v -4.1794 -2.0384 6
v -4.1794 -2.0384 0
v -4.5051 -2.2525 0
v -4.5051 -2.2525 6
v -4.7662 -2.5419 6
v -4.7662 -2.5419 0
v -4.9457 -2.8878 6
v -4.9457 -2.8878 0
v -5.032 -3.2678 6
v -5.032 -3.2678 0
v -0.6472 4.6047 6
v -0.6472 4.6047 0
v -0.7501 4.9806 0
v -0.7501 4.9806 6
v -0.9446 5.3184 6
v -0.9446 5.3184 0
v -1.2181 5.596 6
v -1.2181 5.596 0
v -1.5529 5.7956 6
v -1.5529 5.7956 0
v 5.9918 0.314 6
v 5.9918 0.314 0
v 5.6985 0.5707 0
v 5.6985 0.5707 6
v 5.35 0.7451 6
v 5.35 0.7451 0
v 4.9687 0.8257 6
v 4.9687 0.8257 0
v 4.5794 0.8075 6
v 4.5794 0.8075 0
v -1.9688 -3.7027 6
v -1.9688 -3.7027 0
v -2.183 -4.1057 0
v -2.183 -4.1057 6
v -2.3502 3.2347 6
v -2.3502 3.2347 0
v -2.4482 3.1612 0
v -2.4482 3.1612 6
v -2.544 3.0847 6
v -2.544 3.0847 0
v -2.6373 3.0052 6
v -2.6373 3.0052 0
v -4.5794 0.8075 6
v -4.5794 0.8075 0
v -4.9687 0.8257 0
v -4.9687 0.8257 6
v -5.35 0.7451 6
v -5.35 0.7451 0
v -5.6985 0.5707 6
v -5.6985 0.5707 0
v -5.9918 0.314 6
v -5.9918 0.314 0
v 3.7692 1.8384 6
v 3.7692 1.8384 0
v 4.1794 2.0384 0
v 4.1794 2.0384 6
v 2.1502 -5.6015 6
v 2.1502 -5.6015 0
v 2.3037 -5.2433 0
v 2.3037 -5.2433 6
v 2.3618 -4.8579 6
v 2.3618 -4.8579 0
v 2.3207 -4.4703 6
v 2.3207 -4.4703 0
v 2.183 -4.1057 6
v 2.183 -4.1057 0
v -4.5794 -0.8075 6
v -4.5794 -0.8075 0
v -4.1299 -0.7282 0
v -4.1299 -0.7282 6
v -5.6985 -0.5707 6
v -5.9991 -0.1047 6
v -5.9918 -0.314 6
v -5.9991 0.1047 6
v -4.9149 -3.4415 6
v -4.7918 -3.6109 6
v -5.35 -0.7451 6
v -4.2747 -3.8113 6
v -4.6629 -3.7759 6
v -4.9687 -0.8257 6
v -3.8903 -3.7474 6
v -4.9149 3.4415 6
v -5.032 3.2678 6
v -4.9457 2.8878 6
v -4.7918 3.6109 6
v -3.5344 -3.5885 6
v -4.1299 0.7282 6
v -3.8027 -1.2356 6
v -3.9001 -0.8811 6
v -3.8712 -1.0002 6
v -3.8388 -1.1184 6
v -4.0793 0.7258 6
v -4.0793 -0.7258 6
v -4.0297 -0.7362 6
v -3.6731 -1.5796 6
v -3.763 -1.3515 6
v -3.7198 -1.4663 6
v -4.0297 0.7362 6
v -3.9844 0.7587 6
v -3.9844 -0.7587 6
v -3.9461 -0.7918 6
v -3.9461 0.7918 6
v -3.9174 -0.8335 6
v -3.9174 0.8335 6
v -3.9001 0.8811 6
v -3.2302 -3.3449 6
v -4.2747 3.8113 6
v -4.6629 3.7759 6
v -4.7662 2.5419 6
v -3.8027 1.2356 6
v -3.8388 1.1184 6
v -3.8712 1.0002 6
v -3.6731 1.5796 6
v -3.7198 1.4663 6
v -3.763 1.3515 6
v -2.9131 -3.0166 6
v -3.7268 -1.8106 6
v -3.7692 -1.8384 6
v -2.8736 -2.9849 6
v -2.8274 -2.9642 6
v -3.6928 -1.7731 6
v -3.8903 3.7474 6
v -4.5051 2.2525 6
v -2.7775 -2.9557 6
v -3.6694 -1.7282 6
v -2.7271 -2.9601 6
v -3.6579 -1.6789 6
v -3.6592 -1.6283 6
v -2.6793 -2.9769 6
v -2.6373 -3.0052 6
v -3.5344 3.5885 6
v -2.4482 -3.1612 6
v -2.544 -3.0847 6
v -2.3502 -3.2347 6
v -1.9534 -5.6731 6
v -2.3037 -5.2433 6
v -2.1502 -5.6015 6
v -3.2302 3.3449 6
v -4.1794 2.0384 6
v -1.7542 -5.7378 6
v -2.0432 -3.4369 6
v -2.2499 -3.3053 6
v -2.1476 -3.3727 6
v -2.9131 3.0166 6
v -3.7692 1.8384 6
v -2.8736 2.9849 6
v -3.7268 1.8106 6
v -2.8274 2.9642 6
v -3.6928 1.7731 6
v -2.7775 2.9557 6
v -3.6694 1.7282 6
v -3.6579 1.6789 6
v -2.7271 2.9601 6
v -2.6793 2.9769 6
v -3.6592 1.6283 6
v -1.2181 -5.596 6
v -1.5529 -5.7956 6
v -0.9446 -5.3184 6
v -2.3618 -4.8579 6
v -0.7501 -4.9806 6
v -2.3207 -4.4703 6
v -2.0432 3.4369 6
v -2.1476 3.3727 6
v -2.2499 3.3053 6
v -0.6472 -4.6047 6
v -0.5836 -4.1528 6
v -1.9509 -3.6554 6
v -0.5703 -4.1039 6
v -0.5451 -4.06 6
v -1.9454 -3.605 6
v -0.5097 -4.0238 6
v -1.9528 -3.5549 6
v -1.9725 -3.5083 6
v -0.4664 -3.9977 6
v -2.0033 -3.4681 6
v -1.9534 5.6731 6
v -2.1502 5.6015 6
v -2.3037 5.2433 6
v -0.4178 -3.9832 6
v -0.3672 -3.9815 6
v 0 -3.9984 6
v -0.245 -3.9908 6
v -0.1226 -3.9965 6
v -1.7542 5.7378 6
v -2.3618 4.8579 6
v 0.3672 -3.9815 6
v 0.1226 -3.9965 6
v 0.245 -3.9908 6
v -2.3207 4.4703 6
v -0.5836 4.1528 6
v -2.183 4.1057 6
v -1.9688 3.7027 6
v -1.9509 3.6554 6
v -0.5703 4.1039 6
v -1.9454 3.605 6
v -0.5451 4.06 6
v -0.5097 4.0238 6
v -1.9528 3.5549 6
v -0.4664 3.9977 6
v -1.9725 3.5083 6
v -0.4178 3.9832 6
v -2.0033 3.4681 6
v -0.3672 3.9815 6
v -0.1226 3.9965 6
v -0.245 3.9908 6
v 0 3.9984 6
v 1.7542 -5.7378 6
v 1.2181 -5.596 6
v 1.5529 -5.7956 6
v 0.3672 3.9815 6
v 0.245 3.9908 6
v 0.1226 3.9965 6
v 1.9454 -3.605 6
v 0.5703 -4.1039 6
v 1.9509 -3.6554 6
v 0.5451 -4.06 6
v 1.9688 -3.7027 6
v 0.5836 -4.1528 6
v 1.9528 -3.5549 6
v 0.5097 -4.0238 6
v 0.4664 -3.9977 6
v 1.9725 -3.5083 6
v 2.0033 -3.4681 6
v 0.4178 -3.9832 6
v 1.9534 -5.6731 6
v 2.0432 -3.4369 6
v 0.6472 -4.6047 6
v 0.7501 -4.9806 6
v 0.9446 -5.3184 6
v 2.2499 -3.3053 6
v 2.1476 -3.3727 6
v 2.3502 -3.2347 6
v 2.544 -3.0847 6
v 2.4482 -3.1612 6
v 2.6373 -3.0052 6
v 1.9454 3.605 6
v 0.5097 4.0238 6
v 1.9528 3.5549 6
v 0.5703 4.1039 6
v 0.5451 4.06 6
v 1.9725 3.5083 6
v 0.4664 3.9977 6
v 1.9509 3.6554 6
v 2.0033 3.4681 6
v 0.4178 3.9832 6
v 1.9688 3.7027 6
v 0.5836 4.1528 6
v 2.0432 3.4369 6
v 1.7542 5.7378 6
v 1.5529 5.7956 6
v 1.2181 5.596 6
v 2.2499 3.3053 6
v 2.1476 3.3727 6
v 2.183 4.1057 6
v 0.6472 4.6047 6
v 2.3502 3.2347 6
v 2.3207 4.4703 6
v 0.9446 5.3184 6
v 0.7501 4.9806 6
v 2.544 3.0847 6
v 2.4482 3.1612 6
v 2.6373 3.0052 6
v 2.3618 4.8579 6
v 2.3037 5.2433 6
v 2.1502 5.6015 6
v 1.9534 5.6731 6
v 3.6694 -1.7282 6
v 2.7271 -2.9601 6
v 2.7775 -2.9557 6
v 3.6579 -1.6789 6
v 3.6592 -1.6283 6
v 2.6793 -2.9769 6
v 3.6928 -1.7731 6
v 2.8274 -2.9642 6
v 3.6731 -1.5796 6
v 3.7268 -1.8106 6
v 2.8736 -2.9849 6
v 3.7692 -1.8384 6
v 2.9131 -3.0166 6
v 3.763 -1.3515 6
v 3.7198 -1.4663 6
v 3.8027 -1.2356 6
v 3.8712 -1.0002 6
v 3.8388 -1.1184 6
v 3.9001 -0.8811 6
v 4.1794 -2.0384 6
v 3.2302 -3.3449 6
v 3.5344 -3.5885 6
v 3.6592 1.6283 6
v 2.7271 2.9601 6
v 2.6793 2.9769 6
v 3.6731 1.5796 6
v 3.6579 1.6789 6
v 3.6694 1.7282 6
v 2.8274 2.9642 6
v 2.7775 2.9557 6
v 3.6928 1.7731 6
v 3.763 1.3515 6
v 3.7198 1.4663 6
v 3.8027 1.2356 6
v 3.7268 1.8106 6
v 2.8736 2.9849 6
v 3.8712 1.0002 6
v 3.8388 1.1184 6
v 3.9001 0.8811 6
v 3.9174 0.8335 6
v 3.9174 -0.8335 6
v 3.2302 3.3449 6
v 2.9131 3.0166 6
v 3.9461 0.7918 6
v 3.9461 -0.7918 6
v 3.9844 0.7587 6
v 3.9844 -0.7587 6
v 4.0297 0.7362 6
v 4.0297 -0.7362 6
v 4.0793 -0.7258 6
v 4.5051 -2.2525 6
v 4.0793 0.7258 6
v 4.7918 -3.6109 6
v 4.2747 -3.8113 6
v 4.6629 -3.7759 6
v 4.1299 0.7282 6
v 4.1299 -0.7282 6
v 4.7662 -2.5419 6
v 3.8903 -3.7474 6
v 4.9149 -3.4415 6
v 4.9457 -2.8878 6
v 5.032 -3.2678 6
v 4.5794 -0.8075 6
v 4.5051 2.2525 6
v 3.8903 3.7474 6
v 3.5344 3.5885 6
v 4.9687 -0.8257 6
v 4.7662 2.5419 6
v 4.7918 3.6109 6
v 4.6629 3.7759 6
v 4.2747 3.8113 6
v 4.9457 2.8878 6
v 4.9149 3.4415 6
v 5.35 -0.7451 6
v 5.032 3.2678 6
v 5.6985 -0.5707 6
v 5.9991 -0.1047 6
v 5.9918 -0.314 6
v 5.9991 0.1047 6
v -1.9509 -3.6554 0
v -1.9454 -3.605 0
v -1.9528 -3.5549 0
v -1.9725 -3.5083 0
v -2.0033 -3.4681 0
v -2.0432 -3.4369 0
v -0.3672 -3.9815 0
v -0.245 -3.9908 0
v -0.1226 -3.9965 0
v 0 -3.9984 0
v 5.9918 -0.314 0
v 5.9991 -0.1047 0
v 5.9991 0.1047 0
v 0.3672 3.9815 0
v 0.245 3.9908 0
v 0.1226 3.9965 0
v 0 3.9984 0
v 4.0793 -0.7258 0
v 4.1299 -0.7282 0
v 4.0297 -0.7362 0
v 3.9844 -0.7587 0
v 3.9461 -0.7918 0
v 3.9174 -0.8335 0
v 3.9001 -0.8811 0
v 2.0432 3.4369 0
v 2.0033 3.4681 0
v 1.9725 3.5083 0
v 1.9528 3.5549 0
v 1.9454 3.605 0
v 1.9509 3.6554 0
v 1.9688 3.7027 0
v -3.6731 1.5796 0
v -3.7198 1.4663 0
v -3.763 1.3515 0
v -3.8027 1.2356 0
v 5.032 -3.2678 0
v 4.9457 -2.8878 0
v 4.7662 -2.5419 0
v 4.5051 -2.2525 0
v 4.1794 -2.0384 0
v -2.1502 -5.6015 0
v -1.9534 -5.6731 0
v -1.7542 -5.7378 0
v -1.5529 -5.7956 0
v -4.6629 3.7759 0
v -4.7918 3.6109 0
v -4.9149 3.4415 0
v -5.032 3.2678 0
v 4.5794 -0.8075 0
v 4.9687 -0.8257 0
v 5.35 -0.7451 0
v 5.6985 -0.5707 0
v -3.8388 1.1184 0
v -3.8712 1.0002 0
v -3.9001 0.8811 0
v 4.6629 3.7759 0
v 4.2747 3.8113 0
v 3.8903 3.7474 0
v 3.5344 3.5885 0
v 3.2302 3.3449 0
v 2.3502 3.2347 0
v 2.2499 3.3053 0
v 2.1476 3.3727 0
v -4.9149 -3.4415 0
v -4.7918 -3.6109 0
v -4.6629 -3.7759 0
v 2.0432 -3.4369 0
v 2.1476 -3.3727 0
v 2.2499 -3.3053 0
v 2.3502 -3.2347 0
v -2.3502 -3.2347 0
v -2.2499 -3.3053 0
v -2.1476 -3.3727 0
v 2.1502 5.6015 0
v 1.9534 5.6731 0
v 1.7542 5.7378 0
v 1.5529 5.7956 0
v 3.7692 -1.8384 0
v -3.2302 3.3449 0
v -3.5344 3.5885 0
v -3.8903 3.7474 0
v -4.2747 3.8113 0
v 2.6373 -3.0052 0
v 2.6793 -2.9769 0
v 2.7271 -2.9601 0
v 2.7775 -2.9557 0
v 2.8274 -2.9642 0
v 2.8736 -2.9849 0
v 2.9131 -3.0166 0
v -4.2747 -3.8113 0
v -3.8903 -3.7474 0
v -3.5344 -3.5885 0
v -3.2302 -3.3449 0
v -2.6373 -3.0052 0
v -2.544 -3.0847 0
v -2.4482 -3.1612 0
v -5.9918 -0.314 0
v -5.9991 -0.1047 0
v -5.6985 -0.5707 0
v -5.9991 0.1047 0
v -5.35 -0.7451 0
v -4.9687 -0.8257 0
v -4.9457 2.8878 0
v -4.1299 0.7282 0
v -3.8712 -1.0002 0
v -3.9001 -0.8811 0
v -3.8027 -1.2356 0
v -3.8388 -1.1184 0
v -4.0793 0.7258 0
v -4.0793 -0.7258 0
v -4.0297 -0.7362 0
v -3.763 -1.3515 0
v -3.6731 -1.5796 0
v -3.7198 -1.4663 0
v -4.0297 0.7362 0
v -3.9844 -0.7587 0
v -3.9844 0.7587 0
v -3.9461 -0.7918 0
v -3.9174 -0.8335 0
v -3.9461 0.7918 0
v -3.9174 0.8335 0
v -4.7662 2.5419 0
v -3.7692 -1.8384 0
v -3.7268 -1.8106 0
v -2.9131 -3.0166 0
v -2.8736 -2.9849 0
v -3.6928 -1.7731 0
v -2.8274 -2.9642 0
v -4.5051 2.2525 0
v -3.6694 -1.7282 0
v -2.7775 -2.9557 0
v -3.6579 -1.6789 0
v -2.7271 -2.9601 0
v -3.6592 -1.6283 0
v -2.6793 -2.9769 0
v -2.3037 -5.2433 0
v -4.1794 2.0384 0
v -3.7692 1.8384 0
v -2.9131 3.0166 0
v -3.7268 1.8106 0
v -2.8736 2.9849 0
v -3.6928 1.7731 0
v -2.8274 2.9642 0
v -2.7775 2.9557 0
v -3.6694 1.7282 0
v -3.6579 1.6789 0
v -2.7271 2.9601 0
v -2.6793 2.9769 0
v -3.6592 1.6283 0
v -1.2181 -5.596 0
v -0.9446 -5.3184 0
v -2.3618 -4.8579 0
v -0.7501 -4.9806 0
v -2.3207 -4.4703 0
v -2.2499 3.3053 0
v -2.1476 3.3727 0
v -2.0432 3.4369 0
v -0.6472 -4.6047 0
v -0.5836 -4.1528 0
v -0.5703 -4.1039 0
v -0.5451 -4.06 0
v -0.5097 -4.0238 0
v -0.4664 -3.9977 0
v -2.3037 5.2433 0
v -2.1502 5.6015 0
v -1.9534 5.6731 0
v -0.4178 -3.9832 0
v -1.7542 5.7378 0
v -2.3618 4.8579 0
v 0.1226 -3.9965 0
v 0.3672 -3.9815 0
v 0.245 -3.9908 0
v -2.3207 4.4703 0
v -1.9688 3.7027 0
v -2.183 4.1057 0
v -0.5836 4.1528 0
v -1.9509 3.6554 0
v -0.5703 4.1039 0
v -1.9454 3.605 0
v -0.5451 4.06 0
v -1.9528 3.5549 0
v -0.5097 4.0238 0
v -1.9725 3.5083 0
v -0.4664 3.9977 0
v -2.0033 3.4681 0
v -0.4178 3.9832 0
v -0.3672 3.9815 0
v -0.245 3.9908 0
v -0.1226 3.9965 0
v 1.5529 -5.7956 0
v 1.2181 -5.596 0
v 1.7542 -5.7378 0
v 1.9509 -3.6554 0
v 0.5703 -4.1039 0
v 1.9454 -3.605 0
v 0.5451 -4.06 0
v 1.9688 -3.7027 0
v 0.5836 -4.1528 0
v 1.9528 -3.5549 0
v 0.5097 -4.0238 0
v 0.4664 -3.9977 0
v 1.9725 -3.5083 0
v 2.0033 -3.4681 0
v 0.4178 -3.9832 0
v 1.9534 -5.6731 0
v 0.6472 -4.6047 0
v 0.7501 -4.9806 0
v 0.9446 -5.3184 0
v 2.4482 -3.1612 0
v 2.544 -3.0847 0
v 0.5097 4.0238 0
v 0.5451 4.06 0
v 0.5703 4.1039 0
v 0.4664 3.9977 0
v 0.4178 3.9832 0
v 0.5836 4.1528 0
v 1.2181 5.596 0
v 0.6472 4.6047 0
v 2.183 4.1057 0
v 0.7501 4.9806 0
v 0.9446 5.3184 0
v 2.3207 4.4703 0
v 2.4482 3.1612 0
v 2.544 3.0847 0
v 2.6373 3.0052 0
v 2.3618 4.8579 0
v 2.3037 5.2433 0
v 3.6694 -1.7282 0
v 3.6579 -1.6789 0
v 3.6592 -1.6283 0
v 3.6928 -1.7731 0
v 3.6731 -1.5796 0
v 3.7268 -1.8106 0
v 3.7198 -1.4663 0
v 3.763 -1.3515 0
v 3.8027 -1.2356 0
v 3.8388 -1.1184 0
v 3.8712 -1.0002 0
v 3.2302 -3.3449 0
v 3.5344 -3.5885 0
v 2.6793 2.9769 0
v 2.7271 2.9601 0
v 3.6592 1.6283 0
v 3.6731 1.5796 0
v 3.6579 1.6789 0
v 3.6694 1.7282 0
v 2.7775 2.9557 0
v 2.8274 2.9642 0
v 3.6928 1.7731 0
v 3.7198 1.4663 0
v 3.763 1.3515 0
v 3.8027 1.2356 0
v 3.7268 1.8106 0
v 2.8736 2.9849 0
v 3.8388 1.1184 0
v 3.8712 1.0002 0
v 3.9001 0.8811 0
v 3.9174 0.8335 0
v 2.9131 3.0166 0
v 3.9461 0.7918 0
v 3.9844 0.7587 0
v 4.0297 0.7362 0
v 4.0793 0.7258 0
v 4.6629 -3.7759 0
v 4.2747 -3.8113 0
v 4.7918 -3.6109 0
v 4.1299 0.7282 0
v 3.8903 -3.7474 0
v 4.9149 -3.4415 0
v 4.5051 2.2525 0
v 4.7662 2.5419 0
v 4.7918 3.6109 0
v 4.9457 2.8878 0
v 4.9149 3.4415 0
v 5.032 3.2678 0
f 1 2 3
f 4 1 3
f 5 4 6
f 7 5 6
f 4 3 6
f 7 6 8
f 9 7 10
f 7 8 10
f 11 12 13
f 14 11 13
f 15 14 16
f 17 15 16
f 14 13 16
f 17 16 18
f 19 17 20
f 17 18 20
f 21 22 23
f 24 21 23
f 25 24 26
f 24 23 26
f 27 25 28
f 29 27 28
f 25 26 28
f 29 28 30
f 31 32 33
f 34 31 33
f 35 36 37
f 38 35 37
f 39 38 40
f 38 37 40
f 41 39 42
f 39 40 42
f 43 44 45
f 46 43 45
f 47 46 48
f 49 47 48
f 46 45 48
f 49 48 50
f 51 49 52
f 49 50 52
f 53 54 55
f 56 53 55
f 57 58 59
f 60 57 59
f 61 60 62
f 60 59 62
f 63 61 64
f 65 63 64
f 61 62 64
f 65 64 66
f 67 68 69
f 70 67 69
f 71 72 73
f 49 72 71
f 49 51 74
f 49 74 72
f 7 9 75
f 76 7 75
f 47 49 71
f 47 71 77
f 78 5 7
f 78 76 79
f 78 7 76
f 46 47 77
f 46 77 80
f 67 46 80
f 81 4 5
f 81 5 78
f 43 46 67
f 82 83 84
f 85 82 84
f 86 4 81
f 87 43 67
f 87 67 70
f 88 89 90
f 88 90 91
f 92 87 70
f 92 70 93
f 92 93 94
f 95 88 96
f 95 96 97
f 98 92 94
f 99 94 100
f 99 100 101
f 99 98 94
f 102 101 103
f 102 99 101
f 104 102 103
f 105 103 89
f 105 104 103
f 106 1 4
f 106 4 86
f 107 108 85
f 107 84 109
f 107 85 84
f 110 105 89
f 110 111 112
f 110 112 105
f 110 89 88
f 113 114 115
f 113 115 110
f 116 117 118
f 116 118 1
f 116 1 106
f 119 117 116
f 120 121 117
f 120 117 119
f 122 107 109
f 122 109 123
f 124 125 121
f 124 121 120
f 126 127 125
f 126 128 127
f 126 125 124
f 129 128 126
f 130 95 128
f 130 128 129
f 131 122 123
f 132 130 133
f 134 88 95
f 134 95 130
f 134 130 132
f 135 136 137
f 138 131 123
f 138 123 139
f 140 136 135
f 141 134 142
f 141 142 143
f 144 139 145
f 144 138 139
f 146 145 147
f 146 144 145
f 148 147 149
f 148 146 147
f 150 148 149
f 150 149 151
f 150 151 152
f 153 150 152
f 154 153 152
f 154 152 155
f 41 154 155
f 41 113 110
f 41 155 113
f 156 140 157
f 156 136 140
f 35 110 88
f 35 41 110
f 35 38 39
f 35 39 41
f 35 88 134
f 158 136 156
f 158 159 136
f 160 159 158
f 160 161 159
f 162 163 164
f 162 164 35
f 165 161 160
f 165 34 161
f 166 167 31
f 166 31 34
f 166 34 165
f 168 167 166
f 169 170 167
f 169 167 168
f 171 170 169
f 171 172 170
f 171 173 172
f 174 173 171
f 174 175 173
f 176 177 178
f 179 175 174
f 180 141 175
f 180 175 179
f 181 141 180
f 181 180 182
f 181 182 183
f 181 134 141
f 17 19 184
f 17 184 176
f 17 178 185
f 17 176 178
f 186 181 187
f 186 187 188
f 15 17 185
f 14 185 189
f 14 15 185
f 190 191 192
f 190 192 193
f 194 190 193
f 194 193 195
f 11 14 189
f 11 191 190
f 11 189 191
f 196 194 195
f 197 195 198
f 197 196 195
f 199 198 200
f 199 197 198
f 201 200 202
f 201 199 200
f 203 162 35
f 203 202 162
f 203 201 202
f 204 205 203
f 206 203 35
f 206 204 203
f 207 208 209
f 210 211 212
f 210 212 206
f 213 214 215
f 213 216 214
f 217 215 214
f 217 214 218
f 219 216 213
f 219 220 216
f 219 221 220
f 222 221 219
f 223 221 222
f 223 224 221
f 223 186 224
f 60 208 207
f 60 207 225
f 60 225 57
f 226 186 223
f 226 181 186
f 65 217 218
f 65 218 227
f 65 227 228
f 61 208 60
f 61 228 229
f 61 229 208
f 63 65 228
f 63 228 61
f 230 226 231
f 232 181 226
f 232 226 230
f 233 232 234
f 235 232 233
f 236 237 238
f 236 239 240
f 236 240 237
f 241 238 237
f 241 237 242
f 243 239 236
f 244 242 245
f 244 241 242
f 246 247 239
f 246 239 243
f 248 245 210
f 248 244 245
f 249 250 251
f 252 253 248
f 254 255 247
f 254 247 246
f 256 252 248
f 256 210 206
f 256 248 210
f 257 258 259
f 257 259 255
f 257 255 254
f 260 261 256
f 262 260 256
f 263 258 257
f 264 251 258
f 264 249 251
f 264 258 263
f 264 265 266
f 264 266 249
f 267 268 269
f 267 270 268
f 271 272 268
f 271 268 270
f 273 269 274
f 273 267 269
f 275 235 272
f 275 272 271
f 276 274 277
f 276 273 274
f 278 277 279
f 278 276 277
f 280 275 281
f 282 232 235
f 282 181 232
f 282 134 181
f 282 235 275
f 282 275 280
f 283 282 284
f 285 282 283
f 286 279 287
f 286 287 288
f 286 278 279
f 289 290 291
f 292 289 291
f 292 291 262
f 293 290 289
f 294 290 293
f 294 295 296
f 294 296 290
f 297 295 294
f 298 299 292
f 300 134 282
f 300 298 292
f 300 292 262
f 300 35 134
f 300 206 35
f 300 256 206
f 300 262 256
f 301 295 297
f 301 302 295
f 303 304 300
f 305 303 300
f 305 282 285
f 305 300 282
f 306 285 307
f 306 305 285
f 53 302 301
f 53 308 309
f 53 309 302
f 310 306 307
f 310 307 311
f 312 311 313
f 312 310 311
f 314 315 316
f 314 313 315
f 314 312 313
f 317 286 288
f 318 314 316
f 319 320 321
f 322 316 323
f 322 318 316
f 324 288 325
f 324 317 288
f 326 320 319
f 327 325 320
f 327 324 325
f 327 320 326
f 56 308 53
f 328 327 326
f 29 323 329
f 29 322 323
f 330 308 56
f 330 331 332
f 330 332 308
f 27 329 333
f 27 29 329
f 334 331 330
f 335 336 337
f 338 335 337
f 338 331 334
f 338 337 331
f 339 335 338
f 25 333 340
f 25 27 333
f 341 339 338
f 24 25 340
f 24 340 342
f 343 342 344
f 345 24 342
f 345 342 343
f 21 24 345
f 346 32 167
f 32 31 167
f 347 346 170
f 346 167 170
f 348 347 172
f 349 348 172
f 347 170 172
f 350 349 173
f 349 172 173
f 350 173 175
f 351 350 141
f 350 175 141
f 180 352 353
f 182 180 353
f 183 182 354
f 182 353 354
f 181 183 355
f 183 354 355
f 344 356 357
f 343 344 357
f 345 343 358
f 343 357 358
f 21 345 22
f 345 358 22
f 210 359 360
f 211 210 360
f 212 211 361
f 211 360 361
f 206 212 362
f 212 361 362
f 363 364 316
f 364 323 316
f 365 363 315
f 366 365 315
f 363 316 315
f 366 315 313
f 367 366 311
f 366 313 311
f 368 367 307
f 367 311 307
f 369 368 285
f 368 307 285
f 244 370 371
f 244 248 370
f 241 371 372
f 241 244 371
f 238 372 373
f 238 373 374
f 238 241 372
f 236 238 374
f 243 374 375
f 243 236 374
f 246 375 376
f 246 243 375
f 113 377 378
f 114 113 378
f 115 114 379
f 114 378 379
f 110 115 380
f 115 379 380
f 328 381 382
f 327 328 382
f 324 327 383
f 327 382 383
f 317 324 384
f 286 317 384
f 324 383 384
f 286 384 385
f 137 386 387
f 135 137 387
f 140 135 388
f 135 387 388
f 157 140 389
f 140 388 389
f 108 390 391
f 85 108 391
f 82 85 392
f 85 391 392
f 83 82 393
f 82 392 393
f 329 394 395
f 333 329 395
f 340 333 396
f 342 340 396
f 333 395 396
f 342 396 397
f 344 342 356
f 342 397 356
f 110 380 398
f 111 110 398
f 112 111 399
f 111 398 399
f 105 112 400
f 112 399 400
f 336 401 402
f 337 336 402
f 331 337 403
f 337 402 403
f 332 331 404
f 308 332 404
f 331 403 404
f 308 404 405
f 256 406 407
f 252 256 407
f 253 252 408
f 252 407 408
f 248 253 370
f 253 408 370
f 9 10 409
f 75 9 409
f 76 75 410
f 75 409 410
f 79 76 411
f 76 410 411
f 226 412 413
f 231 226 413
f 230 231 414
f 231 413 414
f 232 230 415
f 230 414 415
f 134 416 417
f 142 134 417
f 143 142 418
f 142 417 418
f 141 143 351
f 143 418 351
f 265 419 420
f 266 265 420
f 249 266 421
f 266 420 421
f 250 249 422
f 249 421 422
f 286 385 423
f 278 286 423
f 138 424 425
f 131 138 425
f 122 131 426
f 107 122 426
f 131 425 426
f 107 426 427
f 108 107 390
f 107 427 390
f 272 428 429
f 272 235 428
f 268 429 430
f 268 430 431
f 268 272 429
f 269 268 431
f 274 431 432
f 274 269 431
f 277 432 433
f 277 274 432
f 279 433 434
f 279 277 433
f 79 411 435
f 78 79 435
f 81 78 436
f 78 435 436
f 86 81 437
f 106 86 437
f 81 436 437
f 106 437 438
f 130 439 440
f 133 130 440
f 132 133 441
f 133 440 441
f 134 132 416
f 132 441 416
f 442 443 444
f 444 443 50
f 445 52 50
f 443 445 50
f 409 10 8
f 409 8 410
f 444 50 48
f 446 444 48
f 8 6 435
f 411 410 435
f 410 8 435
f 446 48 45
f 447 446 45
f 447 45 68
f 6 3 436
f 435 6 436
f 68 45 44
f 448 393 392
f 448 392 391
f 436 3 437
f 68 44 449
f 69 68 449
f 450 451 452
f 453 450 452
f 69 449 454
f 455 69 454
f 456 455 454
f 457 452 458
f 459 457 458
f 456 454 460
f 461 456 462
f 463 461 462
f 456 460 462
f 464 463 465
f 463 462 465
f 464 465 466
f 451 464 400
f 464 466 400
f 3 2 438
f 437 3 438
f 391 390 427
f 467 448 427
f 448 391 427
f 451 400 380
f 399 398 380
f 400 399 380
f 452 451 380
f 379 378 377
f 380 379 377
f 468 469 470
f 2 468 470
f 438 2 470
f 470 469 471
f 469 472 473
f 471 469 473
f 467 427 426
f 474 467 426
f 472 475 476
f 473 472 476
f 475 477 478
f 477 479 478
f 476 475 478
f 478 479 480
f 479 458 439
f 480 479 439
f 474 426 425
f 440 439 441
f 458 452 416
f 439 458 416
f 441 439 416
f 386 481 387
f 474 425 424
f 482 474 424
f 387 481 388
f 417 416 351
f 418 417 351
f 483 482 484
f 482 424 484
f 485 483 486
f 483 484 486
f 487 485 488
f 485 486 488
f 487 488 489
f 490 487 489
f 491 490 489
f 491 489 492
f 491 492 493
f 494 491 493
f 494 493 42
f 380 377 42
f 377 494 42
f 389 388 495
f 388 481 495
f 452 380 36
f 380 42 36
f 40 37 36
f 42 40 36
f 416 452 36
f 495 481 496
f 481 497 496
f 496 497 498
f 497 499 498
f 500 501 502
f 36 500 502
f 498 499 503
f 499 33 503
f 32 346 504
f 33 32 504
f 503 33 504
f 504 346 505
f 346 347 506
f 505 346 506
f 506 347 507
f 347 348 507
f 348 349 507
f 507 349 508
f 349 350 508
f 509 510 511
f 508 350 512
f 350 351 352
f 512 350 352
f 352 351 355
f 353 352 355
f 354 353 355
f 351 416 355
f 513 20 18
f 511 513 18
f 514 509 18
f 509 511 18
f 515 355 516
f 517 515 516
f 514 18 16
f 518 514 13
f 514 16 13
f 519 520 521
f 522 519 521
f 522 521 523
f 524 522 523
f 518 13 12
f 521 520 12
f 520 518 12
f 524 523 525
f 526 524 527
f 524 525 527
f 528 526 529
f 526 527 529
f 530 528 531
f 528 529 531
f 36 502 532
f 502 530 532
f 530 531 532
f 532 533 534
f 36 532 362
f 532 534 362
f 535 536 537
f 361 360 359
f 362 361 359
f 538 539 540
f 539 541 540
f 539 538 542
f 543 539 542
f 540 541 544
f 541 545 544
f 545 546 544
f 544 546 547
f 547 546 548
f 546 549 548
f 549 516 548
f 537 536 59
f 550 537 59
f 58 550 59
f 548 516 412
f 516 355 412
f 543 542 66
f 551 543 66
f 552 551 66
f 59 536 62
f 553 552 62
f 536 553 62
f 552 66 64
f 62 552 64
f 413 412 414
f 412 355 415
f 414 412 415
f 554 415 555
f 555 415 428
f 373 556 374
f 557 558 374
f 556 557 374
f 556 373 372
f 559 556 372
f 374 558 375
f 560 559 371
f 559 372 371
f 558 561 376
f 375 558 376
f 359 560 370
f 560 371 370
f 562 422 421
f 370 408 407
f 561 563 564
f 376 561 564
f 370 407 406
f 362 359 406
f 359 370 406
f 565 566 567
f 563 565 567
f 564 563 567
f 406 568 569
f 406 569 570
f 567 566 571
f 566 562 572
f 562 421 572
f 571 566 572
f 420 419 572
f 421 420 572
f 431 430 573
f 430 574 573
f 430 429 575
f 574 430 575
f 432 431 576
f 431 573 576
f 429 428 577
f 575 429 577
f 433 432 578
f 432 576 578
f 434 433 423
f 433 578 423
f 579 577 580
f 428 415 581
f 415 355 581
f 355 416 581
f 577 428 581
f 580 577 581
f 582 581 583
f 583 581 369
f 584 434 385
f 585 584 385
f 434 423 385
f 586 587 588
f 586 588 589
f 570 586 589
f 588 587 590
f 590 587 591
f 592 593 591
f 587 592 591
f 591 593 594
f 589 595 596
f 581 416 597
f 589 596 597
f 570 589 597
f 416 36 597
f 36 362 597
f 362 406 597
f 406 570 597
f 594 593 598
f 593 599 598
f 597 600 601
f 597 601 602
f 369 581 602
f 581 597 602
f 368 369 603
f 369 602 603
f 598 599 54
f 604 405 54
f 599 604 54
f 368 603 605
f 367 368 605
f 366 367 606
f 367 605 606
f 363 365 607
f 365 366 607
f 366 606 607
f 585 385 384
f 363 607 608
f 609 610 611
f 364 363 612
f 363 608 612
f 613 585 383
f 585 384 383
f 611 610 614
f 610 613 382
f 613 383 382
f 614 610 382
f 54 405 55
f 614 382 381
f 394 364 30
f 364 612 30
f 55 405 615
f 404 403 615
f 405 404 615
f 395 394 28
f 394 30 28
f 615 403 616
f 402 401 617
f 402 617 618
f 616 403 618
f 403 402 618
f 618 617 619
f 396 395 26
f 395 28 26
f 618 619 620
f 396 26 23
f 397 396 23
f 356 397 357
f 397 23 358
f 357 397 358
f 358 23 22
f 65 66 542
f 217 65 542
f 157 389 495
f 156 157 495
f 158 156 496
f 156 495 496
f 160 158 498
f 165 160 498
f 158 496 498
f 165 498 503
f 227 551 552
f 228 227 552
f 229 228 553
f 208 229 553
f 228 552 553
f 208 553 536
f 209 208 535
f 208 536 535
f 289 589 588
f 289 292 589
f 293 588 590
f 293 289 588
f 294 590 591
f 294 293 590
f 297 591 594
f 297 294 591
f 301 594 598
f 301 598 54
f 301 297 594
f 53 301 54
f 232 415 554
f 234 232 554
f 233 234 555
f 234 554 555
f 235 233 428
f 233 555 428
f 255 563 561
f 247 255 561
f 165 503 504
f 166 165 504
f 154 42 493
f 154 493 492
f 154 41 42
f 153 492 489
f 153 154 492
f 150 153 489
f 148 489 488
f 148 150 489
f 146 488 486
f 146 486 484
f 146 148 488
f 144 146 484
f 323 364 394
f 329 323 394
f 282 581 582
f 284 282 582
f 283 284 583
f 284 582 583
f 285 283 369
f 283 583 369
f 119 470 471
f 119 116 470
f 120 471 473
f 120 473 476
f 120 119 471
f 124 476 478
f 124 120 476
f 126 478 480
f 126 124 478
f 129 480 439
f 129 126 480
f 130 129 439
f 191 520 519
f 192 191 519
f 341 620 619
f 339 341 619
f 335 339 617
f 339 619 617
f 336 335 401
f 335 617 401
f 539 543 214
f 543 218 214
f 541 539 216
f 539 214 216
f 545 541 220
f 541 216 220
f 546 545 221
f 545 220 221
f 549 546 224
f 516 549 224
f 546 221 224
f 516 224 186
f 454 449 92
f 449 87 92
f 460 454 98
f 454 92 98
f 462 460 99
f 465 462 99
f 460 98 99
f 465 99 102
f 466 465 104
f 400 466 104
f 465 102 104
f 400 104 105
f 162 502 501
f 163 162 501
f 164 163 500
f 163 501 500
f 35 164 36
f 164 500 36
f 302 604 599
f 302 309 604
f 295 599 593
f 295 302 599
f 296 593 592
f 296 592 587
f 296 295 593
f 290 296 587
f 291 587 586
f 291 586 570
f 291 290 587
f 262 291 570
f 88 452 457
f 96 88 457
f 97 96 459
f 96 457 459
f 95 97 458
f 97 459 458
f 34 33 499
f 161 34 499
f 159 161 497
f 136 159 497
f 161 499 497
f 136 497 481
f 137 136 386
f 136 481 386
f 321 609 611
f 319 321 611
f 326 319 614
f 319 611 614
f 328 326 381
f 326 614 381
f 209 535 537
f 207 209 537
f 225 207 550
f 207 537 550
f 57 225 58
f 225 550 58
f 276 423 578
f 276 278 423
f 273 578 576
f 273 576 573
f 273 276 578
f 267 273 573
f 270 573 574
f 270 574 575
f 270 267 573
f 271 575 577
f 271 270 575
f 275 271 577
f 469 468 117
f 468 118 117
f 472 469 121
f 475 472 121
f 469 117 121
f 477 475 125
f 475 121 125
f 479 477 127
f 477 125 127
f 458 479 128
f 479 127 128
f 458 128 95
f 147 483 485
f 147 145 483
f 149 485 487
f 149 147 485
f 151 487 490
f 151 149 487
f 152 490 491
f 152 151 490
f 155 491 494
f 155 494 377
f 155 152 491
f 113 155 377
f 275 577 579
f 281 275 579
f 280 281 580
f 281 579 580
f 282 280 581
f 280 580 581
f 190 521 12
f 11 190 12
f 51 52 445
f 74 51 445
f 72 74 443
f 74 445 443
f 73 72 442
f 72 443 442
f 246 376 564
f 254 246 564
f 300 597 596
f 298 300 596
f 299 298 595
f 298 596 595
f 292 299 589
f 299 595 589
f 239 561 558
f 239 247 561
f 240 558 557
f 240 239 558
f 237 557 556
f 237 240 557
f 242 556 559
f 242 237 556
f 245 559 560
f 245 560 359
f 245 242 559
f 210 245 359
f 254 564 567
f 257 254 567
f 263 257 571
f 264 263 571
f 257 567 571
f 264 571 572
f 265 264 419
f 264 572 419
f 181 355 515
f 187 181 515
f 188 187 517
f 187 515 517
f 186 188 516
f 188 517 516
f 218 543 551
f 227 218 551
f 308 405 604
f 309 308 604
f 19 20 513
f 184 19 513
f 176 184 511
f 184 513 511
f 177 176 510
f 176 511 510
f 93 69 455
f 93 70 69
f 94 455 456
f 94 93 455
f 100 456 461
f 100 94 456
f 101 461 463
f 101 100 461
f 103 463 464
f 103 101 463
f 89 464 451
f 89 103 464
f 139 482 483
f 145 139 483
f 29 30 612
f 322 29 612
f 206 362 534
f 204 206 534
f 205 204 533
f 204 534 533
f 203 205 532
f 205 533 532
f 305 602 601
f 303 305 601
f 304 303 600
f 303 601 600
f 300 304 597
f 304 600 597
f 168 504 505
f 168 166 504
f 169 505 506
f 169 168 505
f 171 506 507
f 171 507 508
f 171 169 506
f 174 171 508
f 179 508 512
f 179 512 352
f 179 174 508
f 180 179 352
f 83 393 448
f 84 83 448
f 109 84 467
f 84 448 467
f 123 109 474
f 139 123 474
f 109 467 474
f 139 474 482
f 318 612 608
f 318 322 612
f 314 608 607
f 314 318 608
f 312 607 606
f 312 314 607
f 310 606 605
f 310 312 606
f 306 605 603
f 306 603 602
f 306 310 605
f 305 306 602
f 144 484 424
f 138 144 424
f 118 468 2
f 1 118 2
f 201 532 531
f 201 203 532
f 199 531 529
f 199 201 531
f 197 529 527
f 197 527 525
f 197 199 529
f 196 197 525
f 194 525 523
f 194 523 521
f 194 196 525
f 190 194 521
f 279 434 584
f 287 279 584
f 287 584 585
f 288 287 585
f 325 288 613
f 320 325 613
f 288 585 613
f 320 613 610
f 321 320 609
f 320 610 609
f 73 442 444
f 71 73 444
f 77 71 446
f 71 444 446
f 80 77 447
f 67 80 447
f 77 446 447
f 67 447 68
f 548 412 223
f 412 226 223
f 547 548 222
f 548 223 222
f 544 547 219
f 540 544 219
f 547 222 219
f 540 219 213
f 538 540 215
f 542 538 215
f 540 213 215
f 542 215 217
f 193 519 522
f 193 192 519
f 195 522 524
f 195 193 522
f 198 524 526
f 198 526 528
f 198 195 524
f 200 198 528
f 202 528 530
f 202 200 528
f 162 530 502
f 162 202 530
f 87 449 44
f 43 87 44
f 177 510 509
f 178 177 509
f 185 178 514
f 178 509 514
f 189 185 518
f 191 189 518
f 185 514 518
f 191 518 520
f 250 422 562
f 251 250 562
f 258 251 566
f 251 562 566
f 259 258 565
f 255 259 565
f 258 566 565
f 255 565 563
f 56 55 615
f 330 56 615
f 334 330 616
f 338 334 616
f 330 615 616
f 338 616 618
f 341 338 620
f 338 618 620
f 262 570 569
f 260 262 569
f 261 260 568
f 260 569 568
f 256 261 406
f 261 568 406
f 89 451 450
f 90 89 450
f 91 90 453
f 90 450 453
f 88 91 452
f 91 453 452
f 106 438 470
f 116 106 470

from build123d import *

# Parameters (mm, degrees)
BOSS_EXTRUDE1_DEPTH      = 6
FILLET3_R                = 0.2
FILLET4_R                = 0.2
CIRPATTERN1_COUNT        = 10
FILLET3_OF_CIRPATTERN1_R = 0.2
FILLET4_OF_CIRPATTERN1_R = 0.2


with BuildPart() as part:
    # Sketch1 → Boss-Extrude1 (new body)
    with BuildSketch(Plane.XY):
        with BuildLine():
            Line((0, 0), (3.80266937, -1.235562177))
            ThreePointArc((3.80266937, -1.235562177), (3.87959472, -0.967291603), (3.937619073, -0.694308482))
            Line((3.937619073, -0.694308482), (4.579356052, -0.807464026))
            ThreePointArc((4.579356052, -0.807464026), (5.349965783, -0.745072725), (5.991777209, -0.314015737))
            ThreePointArc((5.991777209, -0.314015737), (6, 0), (5.991777209, 0.314015737))
            ThreePointArc((5.991777209, 0.314015737), (5.349965783, 0.745072725), (4.579356052, 0.807464026))
            Line((4.579356052, 0.807464026), (3.937619073, 0.694308482))
            ThreePointArc((3.937619073, 0.694308482), (3.87959472, 0.967291603), (3.80266937, 1.235562177))
            Line((3.80266937, 1.235562177), (0, 0))
        make_face()
    boss_extrude1 = extrude(amount=BOSS_EXTRUDE1_DEPTH)

    # Fillet3
    fillet3_edges = [part.edges().sort_by_distance(p)[0] for p in [
        (3.937619073, 0.694308482, 3),
    ]]
    fillet(fillet3_edges, radius=FILLET3_R)

    # Fillet4
    fillet4_edges = [part.edges().sort_by_distance(p)[0] for p in [
        (3.937619073, -0.694308482, 3),
    ]]
    fillet(fillet4_edges, radius=FILLET4_R)

    # CirPattern1: Boss-Extrude1 ×10 about axis
    cirpattern1_axis = Axis((0, 0, 0), (0, 0, 1))
    for i in range(1, CIRPATTERN1_COUNT):
        add(boss_extrude1.rotate(cirpattern1_axis, i * 360 / CIRPATTERN1_COUNT))

    # Fillet3 of CirPattern1
    fillet3_of_cirpattern1_edges = [part.edges().sort_by_distance(p)[0] for p in [
        (2.777496461, 2.876181782, 3),
        (0.556464605, 3.959451399, 3),
        (-1.877117817, 3.530345158, 3),
        (-3.593705034, 1.752767059, 3),
        (-3.937619073, -0.694308482, 3),
        (-2.777496461, -2.876181782, 3),
        (-0.556464605, -3.959451399, 3),
        (1.877117817, -3.530345158, 3),
        (3.593705034, -1.752767059, 3),
    ]]
    fillet(fillet3_of_cirpattern1_edges, radius=FILLET3_OF_CIRPATTERN1_R)

    # Fillet4 of CirPattern1
    fillet4_of_cirpattern1_edges = [part.edges().sort_by_distance(p)[0] for p in [
        (3.593705034, 1.752767059, 3),
        (1.877117817, 3.530345158, 3),
        (-0.556464605, 3.959451399, 3),
        (-2.777496461, 2.876181782, 3),
        (-3.937619073, 0.694308482, 3),
        (-3.593705034, -1.752767059, 3),
        (-1.877117817, -3.530345158, 3),
        (0.556464605, -3.959451399, 3),
        (2.777496461, -2.876181782, 3),
    ]]
    fillet(fillet4_of_cirpattern1_edges, radius=FILLET4_OF_CIRPATTERN1_R)


solid = part.part
